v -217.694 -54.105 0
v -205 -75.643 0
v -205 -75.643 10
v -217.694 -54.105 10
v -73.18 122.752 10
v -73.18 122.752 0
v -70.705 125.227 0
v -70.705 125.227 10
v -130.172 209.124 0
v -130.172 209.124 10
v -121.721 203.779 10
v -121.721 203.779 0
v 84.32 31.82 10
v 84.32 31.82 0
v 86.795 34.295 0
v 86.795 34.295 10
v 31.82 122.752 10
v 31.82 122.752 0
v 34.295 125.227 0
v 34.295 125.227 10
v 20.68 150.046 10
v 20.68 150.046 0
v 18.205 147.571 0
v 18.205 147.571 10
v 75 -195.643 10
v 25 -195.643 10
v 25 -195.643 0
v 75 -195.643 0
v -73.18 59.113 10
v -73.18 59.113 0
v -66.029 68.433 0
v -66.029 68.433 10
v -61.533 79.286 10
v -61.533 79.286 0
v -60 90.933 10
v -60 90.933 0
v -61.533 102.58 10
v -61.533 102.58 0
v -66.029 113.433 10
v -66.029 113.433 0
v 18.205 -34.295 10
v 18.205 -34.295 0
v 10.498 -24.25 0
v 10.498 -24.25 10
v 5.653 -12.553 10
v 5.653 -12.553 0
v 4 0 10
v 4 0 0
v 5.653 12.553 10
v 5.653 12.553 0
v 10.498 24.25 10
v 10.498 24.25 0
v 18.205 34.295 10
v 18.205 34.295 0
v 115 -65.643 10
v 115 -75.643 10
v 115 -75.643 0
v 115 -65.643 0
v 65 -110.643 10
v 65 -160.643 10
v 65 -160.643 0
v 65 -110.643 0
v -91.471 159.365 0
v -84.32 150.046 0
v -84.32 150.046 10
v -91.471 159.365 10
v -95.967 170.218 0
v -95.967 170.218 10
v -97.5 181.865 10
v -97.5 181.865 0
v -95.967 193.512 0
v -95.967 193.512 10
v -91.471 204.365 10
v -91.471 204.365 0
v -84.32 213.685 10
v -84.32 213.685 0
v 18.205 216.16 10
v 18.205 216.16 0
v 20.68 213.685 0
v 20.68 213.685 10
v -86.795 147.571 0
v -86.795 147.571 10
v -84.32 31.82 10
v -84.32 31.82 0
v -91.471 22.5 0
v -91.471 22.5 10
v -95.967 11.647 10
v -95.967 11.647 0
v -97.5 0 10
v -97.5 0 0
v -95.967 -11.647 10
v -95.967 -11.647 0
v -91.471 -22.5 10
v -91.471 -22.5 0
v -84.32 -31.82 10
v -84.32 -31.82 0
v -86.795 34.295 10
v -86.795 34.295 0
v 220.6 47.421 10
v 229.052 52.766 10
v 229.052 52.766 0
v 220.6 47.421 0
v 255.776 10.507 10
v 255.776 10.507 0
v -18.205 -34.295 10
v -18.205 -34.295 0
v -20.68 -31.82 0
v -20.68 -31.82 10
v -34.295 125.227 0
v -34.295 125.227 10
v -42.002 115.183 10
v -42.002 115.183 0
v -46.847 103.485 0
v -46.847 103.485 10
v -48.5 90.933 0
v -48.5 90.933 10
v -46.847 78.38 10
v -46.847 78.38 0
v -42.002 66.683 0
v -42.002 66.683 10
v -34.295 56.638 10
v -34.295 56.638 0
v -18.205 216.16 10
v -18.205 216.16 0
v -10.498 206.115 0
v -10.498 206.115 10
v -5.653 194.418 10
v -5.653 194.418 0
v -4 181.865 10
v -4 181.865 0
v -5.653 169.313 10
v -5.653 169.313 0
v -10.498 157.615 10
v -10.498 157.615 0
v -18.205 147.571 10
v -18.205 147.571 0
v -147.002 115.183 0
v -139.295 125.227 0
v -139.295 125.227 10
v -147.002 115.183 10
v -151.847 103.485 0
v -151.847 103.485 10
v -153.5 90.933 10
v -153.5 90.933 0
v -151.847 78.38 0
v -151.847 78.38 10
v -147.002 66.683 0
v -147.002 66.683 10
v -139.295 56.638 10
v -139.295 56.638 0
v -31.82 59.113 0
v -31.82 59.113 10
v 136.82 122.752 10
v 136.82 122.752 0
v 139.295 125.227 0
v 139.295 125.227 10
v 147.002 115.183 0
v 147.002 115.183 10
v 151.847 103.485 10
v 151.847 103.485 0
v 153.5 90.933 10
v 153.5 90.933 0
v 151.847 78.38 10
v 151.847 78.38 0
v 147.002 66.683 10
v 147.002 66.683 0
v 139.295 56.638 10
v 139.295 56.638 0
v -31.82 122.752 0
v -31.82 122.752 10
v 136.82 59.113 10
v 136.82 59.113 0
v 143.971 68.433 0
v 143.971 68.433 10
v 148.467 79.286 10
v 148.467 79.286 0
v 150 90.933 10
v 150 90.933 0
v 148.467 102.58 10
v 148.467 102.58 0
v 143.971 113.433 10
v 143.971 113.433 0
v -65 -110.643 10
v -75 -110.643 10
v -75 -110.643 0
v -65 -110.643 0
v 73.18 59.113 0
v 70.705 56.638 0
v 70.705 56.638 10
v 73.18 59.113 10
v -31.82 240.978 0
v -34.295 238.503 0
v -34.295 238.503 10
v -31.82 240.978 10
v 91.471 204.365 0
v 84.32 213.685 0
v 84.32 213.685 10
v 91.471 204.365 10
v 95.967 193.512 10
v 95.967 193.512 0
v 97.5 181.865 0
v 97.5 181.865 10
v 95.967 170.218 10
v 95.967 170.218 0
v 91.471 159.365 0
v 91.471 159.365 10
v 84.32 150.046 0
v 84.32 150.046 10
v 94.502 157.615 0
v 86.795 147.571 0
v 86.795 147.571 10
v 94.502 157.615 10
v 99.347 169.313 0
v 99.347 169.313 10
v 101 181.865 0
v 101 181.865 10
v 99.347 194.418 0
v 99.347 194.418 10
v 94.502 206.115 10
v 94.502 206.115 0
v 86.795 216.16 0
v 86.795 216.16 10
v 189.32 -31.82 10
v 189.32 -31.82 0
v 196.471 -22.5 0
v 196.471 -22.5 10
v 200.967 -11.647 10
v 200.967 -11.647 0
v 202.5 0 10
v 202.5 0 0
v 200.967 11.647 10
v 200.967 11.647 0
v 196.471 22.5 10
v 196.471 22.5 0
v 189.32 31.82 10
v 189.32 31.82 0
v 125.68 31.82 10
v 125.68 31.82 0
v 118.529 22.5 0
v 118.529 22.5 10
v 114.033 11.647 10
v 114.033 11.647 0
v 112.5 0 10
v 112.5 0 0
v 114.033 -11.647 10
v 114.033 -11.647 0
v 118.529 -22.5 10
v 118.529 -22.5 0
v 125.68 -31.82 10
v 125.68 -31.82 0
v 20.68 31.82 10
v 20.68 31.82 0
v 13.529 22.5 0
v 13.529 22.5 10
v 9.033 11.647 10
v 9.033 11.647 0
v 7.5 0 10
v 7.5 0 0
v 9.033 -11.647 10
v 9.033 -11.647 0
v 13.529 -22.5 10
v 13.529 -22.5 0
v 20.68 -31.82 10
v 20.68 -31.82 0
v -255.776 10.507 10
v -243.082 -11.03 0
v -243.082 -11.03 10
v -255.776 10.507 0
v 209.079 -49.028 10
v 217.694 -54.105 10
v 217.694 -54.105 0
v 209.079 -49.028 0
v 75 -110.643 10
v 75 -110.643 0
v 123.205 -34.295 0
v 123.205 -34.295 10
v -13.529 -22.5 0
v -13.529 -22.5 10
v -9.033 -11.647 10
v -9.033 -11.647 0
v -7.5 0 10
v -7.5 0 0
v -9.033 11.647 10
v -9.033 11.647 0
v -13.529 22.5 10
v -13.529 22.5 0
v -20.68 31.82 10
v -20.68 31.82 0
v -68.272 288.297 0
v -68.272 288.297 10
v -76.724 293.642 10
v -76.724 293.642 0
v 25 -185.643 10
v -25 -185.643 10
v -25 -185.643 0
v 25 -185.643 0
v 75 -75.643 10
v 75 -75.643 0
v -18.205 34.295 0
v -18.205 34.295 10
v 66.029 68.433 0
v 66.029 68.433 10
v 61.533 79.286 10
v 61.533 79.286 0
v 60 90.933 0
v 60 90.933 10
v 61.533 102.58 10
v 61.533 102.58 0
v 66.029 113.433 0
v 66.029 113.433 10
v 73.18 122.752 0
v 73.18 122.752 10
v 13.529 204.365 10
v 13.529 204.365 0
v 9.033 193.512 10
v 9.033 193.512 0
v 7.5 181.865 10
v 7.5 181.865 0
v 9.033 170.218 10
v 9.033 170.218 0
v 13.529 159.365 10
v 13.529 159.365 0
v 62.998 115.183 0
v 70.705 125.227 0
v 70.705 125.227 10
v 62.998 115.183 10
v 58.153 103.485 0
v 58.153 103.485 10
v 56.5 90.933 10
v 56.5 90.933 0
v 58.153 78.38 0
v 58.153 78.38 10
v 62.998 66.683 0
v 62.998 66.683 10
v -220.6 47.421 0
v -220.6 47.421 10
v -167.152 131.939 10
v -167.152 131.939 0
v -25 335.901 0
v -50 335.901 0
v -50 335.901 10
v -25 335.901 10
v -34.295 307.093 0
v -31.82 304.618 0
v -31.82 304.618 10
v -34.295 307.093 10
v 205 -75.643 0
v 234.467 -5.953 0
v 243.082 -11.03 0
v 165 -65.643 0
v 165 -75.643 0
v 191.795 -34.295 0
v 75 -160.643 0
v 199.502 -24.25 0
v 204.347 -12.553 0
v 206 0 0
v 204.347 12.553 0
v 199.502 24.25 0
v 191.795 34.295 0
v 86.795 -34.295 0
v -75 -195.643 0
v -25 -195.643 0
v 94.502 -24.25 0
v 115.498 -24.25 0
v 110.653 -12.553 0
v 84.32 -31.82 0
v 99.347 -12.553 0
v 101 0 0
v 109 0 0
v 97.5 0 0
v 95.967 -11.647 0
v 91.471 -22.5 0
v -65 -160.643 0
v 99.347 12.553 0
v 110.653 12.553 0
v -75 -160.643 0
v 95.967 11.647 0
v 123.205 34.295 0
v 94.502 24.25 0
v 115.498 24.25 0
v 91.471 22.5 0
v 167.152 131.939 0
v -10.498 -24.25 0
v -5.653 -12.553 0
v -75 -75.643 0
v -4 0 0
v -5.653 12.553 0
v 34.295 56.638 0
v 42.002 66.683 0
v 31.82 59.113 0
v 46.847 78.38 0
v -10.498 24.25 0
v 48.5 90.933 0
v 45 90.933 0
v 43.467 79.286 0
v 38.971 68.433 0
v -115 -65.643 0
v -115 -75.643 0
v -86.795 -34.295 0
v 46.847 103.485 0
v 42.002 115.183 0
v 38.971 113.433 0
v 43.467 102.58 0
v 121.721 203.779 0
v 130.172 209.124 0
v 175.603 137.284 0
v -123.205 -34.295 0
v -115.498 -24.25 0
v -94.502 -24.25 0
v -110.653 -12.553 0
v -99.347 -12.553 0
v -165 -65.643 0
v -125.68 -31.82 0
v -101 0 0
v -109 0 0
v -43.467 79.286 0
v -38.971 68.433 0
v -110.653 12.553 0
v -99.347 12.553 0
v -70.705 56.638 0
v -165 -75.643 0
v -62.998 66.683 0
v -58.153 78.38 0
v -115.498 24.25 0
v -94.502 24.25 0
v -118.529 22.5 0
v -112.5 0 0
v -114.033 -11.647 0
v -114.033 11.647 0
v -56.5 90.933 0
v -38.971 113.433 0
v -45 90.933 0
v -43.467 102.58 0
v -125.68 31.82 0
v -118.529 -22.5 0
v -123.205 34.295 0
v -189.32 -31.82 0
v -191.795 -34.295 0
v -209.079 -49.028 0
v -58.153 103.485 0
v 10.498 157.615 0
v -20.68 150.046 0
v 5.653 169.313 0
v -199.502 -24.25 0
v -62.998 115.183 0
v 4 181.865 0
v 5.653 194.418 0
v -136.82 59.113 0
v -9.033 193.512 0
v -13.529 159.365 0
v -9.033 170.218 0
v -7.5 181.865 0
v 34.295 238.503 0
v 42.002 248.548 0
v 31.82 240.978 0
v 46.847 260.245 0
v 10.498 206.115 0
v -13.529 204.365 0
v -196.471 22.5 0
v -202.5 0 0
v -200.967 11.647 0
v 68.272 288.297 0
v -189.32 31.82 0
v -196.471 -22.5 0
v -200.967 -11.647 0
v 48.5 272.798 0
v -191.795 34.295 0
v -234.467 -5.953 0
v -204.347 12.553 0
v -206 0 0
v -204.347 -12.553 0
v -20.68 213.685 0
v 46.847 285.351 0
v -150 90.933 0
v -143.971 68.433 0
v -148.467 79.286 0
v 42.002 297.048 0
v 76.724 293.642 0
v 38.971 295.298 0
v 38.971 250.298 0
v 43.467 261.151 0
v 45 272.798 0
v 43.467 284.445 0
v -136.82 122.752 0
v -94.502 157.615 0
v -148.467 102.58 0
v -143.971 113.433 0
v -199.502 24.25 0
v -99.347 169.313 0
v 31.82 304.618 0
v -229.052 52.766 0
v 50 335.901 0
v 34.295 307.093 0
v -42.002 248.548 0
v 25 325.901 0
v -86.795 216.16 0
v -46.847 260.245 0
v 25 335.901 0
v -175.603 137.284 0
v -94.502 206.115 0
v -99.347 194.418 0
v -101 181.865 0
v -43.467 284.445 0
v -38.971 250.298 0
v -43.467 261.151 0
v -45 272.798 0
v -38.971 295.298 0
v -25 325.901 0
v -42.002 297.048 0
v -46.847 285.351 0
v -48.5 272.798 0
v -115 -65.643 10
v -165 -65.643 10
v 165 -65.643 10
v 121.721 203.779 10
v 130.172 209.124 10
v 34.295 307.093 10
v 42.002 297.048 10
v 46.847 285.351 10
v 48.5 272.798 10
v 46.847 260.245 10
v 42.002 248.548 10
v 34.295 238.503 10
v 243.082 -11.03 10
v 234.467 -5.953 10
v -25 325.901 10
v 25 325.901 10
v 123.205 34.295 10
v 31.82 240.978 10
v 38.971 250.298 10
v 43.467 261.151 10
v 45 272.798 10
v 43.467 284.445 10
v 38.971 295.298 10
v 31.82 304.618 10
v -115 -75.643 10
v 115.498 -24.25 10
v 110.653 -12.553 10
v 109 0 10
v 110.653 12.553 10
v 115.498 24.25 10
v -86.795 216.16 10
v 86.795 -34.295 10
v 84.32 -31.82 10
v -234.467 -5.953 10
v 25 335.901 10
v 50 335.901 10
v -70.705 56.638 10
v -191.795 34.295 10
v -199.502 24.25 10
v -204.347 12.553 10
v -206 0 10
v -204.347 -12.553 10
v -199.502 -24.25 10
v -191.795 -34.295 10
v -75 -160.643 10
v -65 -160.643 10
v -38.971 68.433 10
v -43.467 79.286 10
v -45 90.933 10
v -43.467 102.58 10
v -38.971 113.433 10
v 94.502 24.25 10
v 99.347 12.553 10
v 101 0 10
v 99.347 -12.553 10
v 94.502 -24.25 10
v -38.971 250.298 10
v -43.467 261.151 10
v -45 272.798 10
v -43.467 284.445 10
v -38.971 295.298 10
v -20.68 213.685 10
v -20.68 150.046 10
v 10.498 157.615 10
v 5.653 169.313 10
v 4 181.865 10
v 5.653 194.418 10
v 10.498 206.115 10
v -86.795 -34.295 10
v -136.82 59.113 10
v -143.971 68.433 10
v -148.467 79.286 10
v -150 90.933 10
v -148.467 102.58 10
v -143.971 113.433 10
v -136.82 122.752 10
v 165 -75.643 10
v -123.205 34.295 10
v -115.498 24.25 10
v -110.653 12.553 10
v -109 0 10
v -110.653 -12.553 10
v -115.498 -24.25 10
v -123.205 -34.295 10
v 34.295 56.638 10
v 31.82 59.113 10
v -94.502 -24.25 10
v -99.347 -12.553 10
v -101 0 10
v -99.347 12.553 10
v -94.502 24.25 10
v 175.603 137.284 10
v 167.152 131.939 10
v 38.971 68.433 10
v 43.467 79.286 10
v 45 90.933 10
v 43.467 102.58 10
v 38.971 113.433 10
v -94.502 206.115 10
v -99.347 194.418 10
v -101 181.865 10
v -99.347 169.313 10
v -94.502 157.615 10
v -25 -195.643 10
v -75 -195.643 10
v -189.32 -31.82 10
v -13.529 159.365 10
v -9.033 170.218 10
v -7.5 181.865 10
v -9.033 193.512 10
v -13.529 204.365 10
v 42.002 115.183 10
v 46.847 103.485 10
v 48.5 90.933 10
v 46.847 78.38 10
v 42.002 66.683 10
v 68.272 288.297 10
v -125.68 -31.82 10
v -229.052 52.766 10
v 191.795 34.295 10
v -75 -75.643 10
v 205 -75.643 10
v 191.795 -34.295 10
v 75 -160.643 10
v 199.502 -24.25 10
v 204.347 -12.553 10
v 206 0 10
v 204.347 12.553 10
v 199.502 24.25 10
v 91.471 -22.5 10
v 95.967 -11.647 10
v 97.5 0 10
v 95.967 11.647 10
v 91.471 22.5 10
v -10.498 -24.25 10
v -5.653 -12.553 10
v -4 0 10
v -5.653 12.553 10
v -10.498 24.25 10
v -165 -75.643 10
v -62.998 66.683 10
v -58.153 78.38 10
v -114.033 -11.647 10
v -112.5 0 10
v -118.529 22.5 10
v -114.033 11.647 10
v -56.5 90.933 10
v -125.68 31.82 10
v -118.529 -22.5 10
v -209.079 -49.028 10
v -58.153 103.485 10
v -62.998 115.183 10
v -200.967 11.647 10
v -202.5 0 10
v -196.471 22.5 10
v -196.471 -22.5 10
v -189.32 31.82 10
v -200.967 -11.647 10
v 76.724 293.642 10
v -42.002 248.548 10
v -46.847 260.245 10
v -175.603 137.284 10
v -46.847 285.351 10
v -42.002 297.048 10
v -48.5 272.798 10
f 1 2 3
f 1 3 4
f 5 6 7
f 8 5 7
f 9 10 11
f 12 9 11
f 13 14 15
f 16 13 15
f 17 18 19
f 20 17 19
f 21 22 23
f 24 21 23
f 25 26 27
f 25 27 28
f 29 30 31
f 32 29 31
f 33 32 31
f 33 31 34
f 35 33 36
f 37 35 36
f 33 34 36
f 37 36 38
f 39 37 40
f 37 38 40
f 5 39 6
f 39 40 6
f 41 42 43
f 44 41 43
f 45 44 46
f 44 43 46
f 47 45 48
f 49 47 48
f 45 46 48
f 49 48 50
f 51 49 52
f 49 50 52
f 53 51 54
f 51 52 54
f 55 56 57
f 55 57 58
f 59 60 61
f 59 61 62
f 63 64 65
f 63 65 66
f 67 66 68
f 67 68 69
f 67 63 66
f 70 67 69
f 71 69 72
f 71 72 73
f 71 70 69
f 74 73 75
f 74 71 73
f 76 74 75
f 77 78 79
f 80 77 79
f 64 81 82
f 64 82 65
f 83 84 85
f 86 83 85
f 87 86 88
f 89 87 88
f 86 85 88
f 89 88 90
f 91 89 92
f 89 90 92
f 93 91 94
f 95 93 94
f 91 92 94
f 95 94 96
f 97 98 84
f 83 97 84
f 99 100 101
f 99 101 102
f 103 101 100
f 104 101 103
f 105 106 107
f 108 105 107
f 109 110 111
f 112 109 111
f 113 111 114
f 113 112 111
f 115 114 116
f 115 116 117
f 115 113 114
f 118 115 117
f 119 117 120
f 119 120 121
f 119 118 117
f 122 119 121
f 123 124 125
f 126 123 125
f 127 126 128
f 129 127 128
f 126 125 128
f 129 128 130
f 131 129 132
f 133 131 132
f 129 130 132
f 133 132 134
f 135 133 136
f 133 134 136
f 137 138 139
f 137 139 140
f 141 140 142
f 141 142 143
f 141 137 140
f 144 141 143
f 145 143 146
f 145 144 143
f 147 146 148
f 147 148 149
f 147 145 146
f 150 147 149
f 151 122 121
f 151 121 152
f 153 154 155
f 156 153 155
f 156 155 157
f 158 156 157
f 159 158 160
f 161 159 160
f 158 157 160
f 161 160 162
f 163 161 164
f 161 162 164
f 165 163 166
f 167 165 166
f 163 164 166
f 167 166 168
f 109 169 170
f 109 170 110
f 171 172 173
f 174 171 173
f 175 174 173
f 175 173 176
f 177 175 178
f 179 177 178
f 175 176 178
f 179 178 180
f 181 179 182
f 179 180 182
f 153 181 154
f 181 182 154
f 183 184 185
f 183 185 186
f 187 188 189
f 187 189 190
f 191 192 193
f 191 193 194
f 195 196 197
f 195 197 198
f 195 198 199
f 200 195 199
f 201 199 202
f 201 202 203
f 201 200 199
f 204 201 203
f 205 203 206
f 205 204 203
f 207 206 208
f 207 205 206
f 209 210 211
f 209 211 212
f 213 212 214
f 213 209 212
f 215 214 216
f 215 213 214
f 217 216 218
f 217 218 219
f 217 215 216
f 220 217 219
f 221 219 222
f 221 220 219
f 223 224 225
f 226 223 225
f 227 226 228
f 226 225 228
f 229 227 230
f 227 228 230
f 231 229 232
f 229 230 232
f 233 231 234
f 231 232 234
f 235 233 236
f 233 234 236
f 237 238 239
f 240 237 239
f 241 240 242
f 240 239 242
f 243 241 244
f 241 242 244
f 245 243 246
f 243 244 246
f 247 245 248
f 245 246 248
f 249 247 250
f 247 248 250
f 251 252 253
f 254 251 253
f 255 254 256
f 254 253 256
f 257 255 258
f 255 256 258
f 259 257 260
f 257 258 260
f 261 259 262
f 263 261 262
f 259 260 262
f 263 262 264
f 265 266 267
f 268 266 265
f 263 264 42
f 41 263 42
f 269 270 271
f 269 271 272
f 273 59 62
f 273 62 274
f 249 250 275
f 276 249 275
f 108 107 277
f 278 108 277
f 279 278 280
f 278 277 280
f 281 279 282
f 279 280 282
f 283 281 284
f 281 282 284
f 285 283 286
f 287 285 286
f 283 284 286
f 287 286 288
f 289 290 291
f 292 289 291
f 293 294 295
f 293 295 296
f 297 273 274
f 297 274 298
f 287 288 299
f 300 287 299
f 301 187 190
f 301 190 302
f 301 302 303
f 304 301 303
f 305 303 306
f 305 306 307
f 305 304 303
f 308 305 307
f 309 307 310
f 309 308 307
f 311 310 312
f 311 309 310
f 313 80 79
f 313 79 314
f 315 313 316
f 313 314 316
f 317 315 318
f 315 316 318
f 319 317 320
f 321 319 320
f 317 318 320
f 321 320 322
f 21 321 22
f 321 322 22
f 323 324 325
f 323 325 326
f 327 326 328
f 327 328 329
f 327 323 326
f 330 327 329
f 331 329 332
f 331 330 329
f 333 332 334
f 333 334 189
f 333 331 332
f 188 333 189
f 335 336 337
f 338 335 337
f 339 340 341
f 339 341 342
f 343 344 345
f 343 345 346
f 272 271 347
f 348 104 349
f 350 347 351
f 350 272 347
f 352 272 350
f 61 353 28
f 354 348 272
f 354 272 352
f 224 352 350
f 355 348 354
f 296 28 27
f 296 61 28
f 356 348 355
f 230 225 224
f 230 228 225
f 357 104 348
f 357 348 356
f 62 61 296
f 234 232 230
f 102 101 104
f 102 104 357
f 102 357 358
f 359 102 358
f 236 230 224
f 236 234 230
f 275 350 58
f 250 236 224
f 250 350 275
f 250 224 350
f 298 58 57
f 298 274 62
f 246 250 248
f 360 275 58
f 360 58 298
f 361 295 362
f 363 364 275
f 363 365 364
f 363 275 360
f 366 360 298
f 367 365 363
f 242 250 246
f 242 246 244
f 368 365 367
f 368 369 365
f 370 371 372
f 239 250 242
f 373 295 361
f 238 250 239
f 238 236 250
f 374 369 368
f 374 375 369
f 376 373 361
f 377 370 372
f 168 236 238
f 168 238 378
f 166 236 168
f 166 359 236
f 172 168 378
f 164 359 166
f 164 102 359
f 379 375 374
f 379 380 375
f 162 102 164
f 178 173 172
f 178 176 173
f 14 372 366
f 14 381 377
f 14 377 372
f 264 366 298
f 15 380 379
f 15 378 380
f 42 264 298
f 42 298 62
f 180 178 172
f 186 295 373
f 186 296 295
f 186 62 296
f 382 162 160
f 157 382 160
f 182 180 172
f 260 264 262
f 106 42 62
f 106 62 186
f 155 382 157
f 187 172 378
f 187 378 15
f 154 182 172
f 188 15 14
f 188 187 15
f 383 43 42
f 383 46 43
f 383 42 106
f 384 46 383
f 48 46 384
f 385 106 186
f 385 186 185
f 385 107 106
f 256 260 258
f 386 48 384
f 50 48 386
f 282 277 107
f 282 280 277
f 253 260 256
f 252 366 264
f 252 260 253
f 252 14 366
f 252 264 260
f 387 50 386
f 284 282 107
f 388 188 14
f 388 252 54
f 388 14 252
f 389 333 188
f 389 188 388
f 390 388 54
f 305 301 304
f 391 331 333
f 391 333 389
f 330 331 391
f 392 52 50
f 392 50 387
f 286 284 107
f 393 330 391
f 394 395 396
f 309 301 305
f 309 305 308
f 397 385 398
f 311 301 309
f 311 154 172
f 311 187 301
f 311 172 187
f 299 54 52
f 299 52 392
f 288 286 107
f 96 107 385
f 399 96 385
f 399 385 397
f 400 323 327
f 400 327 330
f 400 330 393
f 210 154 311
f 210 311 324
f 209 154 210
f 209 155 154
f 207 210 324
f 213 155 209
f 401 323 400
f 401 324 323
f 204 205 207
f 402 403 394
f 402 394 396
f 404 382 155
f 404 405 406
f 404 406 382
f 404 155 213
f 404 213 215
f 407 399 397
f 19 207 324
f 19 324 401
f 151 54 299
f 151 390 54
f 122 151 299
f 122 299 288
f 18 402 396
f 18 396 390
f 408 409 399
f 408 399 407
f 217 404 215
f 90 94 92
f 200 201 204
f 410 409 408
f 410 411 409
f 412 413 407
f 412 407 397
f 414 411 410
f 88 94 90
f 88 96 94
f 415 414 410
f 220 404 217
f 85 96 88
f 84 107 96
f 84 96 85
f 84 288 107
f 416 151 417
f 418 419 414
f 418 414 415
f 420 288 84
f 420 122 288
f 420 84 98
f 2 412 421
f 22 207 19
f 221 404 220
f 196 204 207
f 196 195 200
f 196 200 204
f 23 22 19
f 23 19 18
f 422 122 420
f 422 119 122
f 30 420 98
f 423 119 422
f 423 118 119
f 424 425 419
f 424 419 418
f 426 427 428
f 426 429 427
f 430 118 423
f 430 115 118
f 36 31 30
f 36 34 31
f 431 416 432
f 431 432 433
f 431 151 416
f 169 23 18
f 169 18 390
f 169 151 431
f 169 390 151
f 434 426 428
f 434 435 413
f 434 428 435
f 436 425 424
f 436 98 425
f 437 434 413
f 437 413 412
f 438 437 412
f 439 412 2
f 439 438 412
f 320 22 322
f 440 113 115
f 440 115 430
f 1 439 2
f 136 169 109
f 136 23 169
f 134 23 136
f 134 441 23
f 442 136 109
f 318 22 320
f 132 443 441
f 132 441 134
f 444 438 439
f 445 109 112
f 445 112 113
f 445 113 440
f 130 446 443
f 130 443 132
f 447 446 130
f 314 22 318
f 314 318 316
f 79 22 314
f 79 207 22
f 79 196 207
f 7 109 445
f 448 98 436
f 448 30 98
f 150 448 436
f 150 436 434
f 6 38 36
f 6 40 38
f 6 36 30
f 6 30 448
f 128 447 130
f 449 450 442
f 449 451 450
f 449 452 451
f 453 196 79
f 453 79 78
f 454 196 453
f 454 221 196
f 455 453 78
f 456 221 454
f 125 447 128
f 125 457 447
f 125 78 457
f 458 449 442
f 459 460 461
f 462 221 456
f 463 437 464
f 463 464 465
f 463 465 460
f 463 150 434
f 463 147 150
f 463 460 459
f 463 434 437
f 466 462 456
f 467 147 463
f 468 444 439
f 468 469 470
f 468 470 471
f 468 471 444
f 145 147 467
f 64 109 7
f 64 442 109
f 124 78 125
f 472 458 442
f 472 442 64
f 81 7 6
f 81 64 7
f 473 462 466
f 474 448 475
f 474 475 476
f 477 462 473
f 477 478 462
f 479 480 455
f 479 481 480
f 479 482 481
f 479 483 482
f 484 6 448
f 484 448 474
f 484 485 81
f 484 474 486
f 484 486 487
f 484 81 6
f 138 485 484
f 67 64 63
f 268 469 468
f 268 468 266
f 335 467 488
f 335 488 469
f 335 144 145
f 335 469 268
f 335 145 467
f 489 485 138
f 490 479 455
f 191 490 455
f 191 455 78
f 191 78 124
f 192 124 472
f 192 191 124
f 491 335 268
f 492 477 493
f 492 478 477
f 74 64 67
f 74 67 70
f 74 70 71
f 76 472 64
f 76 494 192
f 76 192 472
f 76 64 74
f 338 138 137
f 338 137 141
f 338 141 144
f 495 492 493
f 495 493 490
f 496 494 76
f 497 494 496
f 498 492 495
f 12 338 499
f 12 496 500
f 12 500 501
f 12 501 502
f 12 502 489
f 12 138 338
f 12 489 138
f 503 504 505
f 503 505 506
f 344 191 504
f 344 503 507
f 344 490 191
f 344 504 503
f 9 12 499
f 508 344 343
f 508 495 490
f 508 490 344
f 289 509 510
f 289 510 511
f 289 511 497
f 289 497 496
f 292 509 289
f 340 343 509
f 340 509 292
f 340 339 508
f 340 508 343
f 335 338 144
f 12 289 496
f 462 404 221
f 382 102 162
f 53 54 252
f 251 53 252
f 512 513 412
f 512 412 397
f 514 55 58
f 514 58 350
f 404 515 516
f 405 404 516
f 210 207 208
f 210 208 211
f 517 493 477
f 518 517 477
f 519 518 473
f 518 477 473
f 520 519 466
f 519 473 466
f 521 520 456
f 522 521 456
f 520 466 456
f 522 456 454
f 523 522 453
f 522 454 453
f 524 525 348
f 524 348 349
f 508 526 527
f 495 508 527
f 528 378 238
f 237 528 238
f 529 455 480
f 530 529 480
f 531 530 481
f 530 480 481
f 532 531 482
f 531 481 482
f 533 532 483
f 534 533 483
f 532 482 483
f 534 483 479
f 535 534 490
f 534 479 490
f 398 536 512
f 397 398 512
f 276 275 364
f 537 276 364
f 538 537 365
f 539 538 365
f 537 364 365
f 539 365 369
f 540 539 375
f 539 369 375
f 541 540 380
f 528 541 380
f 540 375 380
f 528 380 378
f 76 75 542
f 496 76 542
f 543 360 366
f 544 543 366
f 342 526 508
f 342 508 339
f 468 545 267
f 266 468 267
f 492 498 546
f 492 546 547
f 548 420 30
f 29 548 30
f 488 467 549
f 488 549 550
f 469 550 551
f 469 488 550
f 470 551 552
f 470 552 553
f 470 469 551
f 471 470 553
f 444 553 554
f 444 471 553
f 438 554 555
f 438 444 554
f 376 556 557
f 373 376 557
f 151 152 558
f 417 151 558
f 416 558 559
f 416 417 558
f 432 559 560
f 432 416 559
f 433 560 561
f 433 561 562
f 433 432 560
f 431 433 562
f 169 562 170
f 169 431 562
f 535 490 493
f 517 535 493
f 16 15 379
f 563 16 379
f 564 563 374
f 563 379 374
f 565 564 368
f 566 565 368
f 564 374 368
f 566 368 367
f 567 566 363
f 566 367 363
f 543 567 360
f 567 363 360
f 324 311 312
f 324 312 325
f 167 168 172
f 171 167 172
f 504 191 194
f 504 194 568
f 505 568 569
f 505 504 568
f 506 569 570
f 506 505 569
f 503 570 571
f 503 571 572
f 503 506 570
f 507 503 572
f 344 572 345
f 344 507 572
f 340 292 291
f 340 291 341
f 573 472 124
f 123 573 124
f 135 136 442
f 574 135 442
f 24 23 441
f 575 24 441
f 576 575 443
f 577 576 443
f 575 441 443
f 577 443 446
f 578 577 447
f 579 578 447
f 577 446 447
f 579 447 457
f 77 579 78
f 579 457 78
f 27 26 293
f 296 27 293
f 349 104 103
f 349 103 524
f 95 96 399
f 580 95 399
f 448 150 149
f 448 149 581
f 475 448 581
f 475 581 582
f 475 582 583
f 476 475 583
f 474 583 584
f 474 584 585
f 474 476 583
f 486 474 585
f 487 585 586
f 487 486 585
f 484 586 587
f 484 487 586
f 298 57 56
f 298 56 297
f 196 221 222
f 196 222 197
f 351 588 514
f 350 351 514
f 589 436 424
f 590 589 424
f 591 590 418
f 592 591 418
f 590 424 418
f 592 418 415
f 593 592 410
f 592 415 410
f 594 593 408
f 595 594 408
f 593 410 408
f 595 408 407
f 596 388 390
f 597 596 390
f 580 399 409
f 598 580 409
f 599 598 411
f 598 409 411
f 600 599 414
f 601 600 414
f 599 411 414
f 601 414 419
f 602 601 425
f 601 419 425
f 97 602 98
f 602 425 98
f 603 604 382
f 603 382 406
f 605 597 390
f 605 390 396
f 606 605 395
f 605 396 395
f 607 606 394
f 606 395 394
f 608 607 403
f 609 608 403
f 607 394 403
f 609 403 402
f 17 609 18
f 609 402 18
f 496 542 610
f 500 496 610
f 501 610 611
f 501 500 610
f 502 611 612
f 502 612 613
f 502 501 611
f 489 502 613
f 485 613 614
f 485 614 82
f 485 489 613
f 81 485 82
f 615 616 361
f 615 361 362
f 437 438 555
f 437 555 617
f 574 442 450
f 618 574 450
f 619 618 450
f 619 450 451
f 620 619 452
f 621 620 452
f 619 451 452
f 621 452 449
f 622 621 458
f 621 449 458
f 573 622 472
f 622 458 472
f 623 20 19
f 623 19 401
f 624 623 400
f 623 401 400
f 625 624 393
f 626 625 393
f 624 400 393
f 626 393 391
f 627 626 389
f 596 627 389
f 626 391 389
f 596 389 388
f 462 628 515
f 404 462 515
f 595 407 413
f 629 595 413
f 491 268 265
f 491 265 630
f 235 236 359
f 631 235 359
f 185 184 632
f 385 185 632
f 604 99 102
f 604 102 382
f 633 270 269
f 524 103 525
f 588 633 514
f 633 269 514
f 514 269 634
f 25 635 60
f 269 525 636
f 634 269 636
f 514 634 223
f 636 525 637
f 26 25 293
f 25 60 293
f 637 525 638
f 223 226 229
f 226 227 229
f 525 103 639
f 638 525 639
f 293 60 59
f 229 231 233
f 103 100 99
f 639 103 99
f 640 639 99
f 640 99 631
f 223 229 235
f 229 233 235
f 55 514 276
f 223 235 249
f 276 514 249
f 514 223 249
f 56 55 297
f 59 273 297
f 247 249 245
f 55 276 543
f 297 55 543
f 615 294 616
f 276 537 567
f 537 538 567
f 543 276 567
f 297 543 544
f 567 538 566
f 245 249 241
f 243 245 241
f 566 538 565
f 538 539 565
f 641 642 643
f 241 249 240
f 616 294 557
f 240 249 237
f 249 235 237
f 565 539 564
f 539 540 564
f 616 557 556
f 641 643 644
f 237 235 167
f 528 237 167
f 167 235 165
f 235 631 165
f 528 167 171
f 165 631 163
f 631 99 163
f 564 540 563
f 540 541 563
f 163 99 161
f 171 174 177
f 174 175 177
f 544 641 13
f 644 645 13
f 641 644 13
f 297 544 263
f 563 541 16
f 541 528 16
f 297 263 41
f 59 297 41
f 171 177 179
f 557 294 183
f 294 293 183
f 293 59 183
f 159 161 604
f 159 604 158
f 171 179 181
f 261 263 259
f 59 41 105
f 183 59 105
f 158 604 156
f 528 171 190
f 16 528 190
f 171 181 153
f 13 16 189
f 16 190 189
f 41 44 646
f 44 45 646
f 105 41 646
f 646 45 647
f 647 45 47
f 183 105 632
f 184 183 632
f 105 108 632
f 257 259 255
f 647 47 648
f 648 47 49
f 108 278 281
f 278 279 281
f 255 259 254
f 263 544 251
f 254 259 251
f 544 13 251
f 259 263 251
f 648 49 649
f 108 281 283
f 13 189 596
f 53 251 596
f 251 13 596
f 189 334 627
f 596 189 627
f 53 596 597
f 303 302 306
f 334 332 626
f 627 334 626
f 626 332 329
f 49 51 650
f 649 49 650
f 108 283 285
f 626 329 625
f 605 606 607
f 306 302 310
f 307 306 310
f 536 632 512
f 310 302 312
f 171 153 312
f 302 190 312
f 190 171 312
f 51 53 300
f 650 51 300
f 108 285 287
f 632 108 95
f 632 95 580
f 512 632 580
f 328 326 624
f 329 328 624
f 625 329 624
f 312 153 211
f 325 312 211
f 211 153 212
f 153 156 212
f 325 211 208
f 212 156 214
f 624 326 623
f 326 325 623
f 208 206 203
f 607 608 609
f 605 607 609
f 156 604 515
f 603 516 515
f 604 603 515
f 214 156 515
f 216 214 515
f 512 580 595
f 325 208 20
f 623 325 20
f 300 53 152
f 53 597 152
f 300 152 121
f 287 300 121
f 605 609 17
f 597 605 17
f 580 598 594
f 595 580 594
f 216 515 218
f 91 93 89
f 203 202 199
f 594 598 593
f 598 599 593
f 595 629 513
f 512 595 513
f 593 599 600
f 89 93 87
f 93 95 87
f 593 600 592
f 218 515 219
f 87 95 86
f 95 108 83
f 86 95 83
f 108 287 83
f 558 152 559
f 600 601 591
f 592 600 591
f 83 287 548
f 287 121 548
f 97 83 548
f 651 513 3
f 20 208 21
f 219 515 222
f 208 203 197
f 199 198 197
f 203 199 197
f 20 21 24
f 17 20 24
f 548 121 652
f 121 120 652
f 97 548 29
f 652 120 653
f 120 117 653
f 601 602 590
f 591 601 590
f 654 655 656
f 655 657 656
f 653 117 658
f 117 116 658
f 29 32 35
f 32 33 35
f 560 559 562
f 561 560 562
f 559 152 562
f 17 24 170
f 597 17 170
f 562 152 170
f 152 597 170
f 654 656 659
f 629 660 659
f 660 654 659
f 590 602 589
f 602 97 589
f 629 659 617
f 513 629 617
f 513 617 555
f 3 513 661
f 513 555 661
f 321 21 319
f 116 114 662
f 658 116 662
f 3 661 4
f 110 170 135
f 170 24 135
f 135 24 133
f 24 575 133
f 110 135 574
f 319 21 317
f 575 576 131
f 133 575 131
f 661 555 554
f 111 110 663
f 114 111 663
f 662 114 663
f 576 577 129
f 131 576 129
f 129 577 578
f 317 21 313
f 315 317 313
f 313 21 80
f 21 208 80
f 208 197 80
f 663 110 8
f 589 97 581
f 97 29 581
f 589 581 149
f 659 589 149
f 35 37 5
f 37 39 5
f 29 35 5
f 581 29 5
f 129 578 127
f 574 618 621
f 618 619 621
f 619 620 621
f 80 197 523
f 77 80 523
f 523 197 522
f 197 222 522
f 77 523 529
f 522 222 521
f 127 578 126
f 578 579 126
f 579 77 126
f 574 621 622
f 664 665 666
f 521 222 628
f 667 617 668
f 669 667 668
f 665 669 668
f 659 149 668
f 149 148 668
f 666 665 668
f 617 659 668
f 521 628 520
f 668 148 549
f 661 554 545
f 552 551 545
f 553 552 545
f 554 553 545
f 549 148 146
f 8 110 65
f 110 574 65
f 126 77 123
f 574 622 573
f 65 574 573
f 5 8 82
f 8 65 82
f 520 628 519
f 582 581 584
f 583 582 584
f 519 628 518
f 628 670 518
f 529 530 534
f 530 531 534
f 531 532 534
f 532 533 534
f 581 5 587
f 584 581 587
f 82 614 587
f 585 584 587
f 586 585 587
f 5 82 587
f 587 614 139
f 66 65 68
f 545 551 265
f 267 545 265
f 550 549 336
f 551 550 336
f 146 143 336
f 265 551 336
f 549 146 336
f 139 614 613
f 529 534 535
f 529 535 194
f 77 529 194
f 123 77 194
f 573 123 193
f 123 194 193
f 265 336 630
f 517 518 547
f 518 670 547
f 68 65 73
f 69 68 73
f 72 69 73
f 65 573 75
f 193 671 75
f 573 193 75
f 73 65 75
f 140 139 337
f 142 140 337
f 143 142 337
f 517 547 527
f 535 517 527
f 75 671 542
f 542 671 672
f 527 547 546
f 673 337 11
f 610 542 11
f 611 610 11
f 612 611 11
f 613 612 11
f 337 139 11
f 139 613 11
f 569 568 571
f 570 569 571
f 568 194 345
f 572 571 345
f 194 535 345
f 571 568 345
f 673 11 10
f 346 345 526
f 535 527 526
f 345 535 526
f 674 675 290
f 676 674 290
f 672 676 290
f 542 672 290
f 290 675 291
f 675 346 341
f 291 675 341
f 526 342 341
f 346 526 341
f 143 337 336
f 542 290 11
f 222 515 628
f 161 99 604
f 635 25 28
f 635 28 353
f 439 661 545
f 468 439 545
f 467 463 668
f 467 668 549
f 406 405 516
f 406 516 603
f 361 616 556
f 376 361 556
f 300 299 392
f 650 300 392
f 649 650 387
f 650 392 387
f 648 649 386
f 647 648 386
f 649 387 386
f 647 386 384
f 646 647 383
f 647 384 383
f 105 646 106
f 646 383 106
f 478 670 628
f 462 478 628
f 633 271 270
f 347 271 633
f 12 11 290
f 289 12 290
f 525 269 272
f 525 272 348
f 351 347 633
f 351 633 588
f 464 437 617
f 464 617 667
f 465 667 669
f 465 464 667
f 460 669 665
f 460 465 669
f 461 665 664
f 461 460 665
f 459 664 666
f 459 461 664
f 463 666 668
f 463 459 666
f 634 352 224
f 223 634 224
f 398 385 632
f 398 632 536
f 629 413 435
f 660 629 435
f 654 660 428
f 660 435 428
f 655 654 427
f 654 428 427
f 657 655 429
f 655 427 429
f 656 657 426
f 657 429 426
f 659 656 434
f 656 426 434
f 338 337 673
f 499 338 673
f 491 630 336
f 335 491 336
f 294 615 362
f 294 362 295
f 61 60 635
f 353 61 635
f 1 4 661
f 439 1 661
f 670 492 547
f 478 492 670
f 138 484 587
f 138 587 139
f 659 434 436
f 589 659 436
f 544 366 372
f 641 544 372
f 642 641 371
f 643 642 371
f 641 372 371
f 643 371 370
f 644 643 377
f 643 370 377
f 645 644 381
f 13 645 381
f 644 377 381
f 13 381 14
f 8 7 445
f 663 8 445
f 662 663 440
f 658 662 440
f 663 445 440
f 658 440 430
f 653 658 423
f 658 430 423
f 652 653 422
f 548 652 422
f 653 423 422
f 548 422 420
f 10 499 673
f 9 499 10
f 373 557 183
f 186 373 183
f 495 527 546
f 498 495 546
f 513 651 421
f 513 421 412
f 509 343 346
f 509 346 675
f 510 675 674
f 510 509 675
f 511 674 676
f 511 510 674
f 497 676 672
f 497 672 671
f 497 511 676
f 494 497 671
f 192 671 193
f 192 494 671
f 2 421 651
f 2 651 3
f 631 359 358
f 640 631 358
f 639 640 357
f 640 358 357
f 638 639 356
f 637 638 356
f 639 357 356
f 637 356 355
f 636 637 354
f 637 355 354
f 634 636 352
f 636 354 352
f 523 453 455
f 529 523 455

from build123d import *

# Parameters (mm, degrees)
BOSS_EXTRU_1_DEPTH      = 10
ESQUISSE2_W             = 150
ESQUISSE2_H             = 120
BOSS_EXTRU_2_DEPTH      = 10
ESQUISSE3_W             = 10
ESQUISSE3_H             = 50
ESQUISSE3_W_2           = 50
ESQUISSE3_H_2           = 10
ENL_V_MAT_EXTRU_1_DEPTH = 10
ESQUISSE4_W             = 50
ESQUISSE4_H             = 10
ENL_V_MAT_EXTRU_2_DEPTH = 10


with BuildPart() as part:
    # Esquisse1 → Boss.-Extru.1 (new body)
    with BuildSketch(Plane.XY):
        Polygon((-50, 335.901139535), (50, 335.901139535), (255.775862069, 10.507079064), (205, -75.642859016), (-205, -75.642859016), (-255.775862069, 10.507079064), align=None)
        with BuildLine():
            Line((-189.319805153, 31.819805153), (-191.794678888, 34.294678888))
            ThreePointArc((-191.794678888, 34.294678888), (-206, 0), (-191.794678888, -34.294678888))
            Line((-191.794678888, -34.294678888), (-189.319805153, -31.819805153))
            ThreePointArc((-189.319805153, -31.819805153), (-202.5, 0), (-189.319805153, 31.819805153))
        make_face(mode=Mode.SUBTRACT)
        with BuildLine():
            Line((-125.680194847, 31.819805153), (-123.205321112, 34.294678888))
            ThreePointArc((-123.205321112, 34.294678888), (-109, 0), (-123.205321112, -34.294678888))
            Line((-123.205321112, -34.294678888), (-125.680194847, -31.819805153))
            ThreePointArc((-125.680194847, -31.819805153), (-112.5, 0), (-125.680194847, 31.819805153))
        make_face(mode=Mode.SUBTRACT)
        with BuildLine():
            Line((-84.319805153, -31.819805153), (-86.794678888, -34.294678888))
            ThreePointArc((-86.794678888, -34.294678888), (-101, 0), (-86.794678888, 34.294678888))
            Line((-86.794678888, 34.294678888), (-84.319805153, 31.819805153))
            ThreePointArc((-84.319805153, 31.819805153), (-97.5, 0), (-84.319805153, -31.819805153))
        make_face(mode=Mode.SUBTRACT)
        with BuildLine():
            Line((-20.680194847, 31.819805153), (-18.205321112, 34.294678888))
            ThreePointArc((-18.205321112, 34.294678888), (-4, 0), (-18.205321112, -34.294678888))
            Line((-18.205321112, -34.294678888), (-20.680194847, -31.819805153))
            ThreePointArc((-20.680194847, -31.819805153), (-7.5, 0), (-20.680194847, 31.819805153))
        make_face(mode=Mode.SUBTRACT)
        with BuildLine():
            Line((20.680194847, -31.819805153), (18.205321112, -34.294678888))
            ThreePointArc((18.205321112, -34.294678888), (4, 0), (18.205321112, 34.294678888))
            Line((18.205321112, 34.294678888), (20.680194847, 31.819805153))
            ThreePointArc((20.680194847, 31.819805153), (7.5, 0), (20.680194847, -31.819805153))
        make_face(mode=Mode.SUBTRACT)
        with BuildLine():
            Line((84.319805153, 31.819805153), (86.794678888, 34.294678888))
            ThreePointArc((86.794678888, 34.294678888), (101, 0), (86.794678888, -34.294678888))
            Line((86.794678888, -34.294678888), (84.319805153, -31.819805153))
            ThreePointArc((84.319805153, -31.819805153), (97.5, 0), (84.319805153, 31.819805153))
        make_face(mode=Mode.SUBTRACT)
        with BuildLine():
            Line((125.680194847, -31.819805153), (123.205321112, -34.294678888))
            ThreePointArc((123.205321112, -34.294678888), (109, 0), (123.205321112, 34.294678888))
            Line((123.205321112, 34.294678888), (125.680194847, 31.819805153))
            ThreePointArc((125.680194847, 31.819805153), (112.5, 0), (125.680194847, -31.819805153))
        make_face(mode=Mode.SUBTRACT)
        with BuildLine():
            Line((189.319805153, 31.819805153), (191.794678888, 34.294678888))
            ThreePointArc((191.794678888, 34.294678888), (206, 0), (191.794678888, -34.294678888))
            Line((191.794678888, -34.294678888), (189.319805153, -31.819805153))
            ThreePointArc((189.319805153, -31.819805153), (202.5, 0), (189.319805153, 31.819805153))
        make_face(mode=Mode.SUBTRACT)
        with BuildLine():
            Line((-139.294678888, 56.63798851), (-136.819805153, 59.112862244))
            ThreePointArc((-136.819805153, 59.112862244), (-150, 90.932667397), (-136.819805153, 122.752472551))
            Line((-136.819805153, 122.752472551), (-139.294678888, 125.227346285))
            ThreePointArc((-139.294678888, 125.227346285), (-153.5, 90.932667397), (-139.294678888, 56.63798851))
        make_face(mode=Mode.SUBTRACT)
        with BuildLine():
            Line((-70.705321112, 56.63798851), (-73.180194847, 59.112862244))
            ThreePointArc((-73.180194847, 59.112862244), (-60, 90.932667397), (-73.180194847, 122.752472551))
            Line((-73.180194847, 122.752472551), (-70.705321112, 125.227346285))
            ThreePointArc((-70.705321112, 125.227346285), (-56.5, 90.932667397), (-70.705321112, 56.63798851))
        make_face(mode=Mode.SUBTRACT)
        with BuildLine():
            Line((-31.819805153, 122.752472551), (-34.294678888, 125.227346285))
            ThreePointArc((-34.294678888, 125.227346285), (-48.5, 90.932667397), (-34.294678888, 56.63798851))
            Line((-34.294678888, 56.63798851), (-31.819805153, 59.112862244))
            ThreePointArc((-31.819805153, 59.112862244), (-45, 90.932667397), (-31.819805153, 122.752472551))
        make_face(mode=Mode.SUBTRACT)
        with BuildLine():
            Line((34.294678888, 56.63798851), (31.819805153, 59.112862244))
            ThreePointArc((31.819805153, 59.112862244), (45, 90.932667397), (31.819805153, 122.752472551))
            Line((31.819805153, 122.752472551), (34.294678888, 125.227346285))
            ThreePointArc((34.294678888, 125.227346285), (48.5, 90.932667397), (34.294678888, 56.63798851))
        make_face(mode=Mode.SUBTRACT)
        with BuildLine():
            Line((73.180194847, 122.752472551), (70.705321112, 125.227346285))
            ThreePointArc((70.705321112, 125.227346285), (56.5, 90.932667397), (70.705321112, 56.63798851))
            Line((70.705321112, 56.63798851), (73.180194847, 59.112862244))
            ThreePointArc((73.180194847, 59.112862244), (60, 90.932667397), (73.180194847, 122.752472551))
        make_face(mode=Mode.SUBTRACT)
        with BuildLine():
            Line((139.294678888, 56.63798851), (136.819805153, 59.112862244))
            ThreePointArc((136.819805153, 59.112862244), (150, 90.932667397), (136.819805153, 122.752472551))
            Line((136.819805153, 122.752472551), (139.294678888, 125.227346285))
            ThreePointArc((139.294678888, 125.227346285), (153.5, 90.932667397), (139.294678888, 56.63798851))
        make_face(mode=Mode.SUBTRACT)
        with BuildLine():
            Line((-84.319805153, 213.685139948), (-86.794678888, 216.160013682))
            ThreePointArc((-86.794678888, 216.160013682), (-101, 181.865334795), (-86.794678888, 147.570655907))
            Line((-86.794678888, 147.570655907), (-84.319805153, 150.045529641))
            ThreePointArc((-84.319805153, 150.045529641), (-97.5, 181.865334795), (-84.319805153, 213.685139948))
        make_face(mode=Mode.SUBTRACT)
        with BuildLine():
            Line((-20.680194847, 213.685139948), (-18.205321112, 216.160013682))
            ThreePointArc((-18.205321112, 216.160013682), (-4, 181.865334795), (-18.205321112, 147.570655907))
            Line((-18.205321112, 147.570655907), (-20.680194847, 150.045529641))
            ThreePointArc((-20.680194847, 150.045529641), (-7.5, 181.865334795), (-20.680194847, 213.685139948))
        make_face(mode=Mode.SUBTRACT)
        with BuildLine():
            Line((20.680194847, 150.045529641), (18.205321112, 147.570655907))
            ThreePointArc((18.205321112, 147.570655907), (4, 181.865334795), (18.205321112, 216.160013682))
            Line((18.205321112, 216.160013682), (20.680194847, 213.685139948))
            ThreePointArc((20.680194847, 213.685139948), (7.5, 181.865334795), (20.680194847, 150.045529641))
        make_face(mode=Mode.SUBTRACT)
        with BuildLine():
            Line((84.319805153, 150.045529641), (86.794678888, 147.570655907))
            ThreePointArc((86.794678888, 147.570655907), (101, 181.865334795), (86.794678888, 216.160013682))
            Line((86.794678888, 216.160013682), (84.319805153, 213.685139948))
            ThreePointArc((84.319805153, 213.685139948), (97.5, 181.865334795), (84.319805153, 150.045529641))
        make_face(mode=Mode.SUBTRACT)
        with BuildLine():
            Line((-31.819805153, 304.617807345), (-34.294678888, 307.09268108))
            ThreePointArc((-34.294678888, 307.09268108), (-48.5, 272.798002192), (-34.294678888, 238.503323305))
            Line((-34.294678888, 238.503323305), (-31.819805153, 240.978197039))
            ThreePointArc((-31.819805153, 240.978197039), (-45, 272.798002192), (-31.819805153, 304.617807345))
        make_face(mode=Mode.SUBTRACT)
        with BuildLine():
            Line((31.819805153, 304.617807345), (34.294678888, 307.09268108))
            ThreePointArc((34.294678888, 307.09268108), (48.5, 272.798002192), (34.294678888, 238.503323305))
            Line((34.294678888, 238.503323305), (31.819805153, 240.978197039))
            ThreePointArc((31.819805153, 240.978197039), (45, 272.798002192), (31.819805153, 304.617807345))
        make_face(mode=Mode.SUBTRACT)
    extrude(amount=BOSS_EXTRU_1_DEPTH)

    # Esquisse2 → Boss.-Extru.2 (add)
    with BuildSketch(Plane.XY.offset(10)):
        with Locations((0, -135.642859016)):
            Rectangle(ESQUISSE2_W, ESQUISSE2_H)
    extrude(amount=-BOSS_EXTRU_2_DEPTH)

    # Esquisse3 → Enlèv. mat.-Extru.1 (cut)
    with BuildSketch(Plane.XY.offset(10)):
        with Locations((-70, -135.642859016)):
            Rectangle(ESQUISSE3_W, ESQUISSE3_H)
        with Locations((0, -190.642859016)):
            Rectangle(ESQUISSE3_W_2, ESQUISSE3_H_2)
        with Locations((70, -135.642859016)):
            Rectangle(ESQUISSE3_W, ESQUISSE3_H)
    extrude(amount=-ENL_V_MAT_EXTRU_1_DEPTH, mode=Mode.SUBTRACT)

    # Esquisse4 → Enlèv. mat.-Extru.2 (cut)
    with BuildSketch(Plane.XY.offset(10)):
        with Locations((-140, -70.642859016)):
            Rectangle(ESQUISSE4_W, ESQUISSE4_H)
        Polygon((-217.693965517, -54.105374496), (-209.078971709, -49.027788289), (-234.466902744, -5.952819249), (-243.081896552, -11.030405456), align=None)
        Polygon((-229.051724138, 52.766047956), (-220.599930359, 47.42122037), (-167.151654497, 131.939158154), (-175.603448276, 137.283985741), align=None)
        Polygon((-68.272344153, 288.297343056), (-76.724137931, 293.642170642), (-130.172413793, 209.124232858), (-121.720620015, 203.779405271), align=None)
        with Locations((0, 330.901139535)):
            Rectangle(ESQUISSE4_W, ESQUISSE4_H)
        with Locations((140, -70.642859016)):
            Rectangle(ESQUISSE4_W, ESQUISSE4_H)
        Polygon((234.466902744, -5.952819249), (243.081896552, -11.030405456), (217.693965517, -54.105374496), (209.078971709, -49.027788289), align=None)
        Polygon((167.151654497, 131.939158154), (175.603448276, 137.283985741), (229.051724138, 52.766047956), (220.599930359, 47.42122037), align=None)
        Polygon((121.720620015, 203.779405271), (130.172413793, 209.124232858), (76.724137931, 293.642170642), (68.272344153, 288.297343056), align=None)
    extrude(amount=-ENL_V_MAT_EXTRU_2_DEPTH, mode=Mode.SUBTRACT)


solid = part.part
